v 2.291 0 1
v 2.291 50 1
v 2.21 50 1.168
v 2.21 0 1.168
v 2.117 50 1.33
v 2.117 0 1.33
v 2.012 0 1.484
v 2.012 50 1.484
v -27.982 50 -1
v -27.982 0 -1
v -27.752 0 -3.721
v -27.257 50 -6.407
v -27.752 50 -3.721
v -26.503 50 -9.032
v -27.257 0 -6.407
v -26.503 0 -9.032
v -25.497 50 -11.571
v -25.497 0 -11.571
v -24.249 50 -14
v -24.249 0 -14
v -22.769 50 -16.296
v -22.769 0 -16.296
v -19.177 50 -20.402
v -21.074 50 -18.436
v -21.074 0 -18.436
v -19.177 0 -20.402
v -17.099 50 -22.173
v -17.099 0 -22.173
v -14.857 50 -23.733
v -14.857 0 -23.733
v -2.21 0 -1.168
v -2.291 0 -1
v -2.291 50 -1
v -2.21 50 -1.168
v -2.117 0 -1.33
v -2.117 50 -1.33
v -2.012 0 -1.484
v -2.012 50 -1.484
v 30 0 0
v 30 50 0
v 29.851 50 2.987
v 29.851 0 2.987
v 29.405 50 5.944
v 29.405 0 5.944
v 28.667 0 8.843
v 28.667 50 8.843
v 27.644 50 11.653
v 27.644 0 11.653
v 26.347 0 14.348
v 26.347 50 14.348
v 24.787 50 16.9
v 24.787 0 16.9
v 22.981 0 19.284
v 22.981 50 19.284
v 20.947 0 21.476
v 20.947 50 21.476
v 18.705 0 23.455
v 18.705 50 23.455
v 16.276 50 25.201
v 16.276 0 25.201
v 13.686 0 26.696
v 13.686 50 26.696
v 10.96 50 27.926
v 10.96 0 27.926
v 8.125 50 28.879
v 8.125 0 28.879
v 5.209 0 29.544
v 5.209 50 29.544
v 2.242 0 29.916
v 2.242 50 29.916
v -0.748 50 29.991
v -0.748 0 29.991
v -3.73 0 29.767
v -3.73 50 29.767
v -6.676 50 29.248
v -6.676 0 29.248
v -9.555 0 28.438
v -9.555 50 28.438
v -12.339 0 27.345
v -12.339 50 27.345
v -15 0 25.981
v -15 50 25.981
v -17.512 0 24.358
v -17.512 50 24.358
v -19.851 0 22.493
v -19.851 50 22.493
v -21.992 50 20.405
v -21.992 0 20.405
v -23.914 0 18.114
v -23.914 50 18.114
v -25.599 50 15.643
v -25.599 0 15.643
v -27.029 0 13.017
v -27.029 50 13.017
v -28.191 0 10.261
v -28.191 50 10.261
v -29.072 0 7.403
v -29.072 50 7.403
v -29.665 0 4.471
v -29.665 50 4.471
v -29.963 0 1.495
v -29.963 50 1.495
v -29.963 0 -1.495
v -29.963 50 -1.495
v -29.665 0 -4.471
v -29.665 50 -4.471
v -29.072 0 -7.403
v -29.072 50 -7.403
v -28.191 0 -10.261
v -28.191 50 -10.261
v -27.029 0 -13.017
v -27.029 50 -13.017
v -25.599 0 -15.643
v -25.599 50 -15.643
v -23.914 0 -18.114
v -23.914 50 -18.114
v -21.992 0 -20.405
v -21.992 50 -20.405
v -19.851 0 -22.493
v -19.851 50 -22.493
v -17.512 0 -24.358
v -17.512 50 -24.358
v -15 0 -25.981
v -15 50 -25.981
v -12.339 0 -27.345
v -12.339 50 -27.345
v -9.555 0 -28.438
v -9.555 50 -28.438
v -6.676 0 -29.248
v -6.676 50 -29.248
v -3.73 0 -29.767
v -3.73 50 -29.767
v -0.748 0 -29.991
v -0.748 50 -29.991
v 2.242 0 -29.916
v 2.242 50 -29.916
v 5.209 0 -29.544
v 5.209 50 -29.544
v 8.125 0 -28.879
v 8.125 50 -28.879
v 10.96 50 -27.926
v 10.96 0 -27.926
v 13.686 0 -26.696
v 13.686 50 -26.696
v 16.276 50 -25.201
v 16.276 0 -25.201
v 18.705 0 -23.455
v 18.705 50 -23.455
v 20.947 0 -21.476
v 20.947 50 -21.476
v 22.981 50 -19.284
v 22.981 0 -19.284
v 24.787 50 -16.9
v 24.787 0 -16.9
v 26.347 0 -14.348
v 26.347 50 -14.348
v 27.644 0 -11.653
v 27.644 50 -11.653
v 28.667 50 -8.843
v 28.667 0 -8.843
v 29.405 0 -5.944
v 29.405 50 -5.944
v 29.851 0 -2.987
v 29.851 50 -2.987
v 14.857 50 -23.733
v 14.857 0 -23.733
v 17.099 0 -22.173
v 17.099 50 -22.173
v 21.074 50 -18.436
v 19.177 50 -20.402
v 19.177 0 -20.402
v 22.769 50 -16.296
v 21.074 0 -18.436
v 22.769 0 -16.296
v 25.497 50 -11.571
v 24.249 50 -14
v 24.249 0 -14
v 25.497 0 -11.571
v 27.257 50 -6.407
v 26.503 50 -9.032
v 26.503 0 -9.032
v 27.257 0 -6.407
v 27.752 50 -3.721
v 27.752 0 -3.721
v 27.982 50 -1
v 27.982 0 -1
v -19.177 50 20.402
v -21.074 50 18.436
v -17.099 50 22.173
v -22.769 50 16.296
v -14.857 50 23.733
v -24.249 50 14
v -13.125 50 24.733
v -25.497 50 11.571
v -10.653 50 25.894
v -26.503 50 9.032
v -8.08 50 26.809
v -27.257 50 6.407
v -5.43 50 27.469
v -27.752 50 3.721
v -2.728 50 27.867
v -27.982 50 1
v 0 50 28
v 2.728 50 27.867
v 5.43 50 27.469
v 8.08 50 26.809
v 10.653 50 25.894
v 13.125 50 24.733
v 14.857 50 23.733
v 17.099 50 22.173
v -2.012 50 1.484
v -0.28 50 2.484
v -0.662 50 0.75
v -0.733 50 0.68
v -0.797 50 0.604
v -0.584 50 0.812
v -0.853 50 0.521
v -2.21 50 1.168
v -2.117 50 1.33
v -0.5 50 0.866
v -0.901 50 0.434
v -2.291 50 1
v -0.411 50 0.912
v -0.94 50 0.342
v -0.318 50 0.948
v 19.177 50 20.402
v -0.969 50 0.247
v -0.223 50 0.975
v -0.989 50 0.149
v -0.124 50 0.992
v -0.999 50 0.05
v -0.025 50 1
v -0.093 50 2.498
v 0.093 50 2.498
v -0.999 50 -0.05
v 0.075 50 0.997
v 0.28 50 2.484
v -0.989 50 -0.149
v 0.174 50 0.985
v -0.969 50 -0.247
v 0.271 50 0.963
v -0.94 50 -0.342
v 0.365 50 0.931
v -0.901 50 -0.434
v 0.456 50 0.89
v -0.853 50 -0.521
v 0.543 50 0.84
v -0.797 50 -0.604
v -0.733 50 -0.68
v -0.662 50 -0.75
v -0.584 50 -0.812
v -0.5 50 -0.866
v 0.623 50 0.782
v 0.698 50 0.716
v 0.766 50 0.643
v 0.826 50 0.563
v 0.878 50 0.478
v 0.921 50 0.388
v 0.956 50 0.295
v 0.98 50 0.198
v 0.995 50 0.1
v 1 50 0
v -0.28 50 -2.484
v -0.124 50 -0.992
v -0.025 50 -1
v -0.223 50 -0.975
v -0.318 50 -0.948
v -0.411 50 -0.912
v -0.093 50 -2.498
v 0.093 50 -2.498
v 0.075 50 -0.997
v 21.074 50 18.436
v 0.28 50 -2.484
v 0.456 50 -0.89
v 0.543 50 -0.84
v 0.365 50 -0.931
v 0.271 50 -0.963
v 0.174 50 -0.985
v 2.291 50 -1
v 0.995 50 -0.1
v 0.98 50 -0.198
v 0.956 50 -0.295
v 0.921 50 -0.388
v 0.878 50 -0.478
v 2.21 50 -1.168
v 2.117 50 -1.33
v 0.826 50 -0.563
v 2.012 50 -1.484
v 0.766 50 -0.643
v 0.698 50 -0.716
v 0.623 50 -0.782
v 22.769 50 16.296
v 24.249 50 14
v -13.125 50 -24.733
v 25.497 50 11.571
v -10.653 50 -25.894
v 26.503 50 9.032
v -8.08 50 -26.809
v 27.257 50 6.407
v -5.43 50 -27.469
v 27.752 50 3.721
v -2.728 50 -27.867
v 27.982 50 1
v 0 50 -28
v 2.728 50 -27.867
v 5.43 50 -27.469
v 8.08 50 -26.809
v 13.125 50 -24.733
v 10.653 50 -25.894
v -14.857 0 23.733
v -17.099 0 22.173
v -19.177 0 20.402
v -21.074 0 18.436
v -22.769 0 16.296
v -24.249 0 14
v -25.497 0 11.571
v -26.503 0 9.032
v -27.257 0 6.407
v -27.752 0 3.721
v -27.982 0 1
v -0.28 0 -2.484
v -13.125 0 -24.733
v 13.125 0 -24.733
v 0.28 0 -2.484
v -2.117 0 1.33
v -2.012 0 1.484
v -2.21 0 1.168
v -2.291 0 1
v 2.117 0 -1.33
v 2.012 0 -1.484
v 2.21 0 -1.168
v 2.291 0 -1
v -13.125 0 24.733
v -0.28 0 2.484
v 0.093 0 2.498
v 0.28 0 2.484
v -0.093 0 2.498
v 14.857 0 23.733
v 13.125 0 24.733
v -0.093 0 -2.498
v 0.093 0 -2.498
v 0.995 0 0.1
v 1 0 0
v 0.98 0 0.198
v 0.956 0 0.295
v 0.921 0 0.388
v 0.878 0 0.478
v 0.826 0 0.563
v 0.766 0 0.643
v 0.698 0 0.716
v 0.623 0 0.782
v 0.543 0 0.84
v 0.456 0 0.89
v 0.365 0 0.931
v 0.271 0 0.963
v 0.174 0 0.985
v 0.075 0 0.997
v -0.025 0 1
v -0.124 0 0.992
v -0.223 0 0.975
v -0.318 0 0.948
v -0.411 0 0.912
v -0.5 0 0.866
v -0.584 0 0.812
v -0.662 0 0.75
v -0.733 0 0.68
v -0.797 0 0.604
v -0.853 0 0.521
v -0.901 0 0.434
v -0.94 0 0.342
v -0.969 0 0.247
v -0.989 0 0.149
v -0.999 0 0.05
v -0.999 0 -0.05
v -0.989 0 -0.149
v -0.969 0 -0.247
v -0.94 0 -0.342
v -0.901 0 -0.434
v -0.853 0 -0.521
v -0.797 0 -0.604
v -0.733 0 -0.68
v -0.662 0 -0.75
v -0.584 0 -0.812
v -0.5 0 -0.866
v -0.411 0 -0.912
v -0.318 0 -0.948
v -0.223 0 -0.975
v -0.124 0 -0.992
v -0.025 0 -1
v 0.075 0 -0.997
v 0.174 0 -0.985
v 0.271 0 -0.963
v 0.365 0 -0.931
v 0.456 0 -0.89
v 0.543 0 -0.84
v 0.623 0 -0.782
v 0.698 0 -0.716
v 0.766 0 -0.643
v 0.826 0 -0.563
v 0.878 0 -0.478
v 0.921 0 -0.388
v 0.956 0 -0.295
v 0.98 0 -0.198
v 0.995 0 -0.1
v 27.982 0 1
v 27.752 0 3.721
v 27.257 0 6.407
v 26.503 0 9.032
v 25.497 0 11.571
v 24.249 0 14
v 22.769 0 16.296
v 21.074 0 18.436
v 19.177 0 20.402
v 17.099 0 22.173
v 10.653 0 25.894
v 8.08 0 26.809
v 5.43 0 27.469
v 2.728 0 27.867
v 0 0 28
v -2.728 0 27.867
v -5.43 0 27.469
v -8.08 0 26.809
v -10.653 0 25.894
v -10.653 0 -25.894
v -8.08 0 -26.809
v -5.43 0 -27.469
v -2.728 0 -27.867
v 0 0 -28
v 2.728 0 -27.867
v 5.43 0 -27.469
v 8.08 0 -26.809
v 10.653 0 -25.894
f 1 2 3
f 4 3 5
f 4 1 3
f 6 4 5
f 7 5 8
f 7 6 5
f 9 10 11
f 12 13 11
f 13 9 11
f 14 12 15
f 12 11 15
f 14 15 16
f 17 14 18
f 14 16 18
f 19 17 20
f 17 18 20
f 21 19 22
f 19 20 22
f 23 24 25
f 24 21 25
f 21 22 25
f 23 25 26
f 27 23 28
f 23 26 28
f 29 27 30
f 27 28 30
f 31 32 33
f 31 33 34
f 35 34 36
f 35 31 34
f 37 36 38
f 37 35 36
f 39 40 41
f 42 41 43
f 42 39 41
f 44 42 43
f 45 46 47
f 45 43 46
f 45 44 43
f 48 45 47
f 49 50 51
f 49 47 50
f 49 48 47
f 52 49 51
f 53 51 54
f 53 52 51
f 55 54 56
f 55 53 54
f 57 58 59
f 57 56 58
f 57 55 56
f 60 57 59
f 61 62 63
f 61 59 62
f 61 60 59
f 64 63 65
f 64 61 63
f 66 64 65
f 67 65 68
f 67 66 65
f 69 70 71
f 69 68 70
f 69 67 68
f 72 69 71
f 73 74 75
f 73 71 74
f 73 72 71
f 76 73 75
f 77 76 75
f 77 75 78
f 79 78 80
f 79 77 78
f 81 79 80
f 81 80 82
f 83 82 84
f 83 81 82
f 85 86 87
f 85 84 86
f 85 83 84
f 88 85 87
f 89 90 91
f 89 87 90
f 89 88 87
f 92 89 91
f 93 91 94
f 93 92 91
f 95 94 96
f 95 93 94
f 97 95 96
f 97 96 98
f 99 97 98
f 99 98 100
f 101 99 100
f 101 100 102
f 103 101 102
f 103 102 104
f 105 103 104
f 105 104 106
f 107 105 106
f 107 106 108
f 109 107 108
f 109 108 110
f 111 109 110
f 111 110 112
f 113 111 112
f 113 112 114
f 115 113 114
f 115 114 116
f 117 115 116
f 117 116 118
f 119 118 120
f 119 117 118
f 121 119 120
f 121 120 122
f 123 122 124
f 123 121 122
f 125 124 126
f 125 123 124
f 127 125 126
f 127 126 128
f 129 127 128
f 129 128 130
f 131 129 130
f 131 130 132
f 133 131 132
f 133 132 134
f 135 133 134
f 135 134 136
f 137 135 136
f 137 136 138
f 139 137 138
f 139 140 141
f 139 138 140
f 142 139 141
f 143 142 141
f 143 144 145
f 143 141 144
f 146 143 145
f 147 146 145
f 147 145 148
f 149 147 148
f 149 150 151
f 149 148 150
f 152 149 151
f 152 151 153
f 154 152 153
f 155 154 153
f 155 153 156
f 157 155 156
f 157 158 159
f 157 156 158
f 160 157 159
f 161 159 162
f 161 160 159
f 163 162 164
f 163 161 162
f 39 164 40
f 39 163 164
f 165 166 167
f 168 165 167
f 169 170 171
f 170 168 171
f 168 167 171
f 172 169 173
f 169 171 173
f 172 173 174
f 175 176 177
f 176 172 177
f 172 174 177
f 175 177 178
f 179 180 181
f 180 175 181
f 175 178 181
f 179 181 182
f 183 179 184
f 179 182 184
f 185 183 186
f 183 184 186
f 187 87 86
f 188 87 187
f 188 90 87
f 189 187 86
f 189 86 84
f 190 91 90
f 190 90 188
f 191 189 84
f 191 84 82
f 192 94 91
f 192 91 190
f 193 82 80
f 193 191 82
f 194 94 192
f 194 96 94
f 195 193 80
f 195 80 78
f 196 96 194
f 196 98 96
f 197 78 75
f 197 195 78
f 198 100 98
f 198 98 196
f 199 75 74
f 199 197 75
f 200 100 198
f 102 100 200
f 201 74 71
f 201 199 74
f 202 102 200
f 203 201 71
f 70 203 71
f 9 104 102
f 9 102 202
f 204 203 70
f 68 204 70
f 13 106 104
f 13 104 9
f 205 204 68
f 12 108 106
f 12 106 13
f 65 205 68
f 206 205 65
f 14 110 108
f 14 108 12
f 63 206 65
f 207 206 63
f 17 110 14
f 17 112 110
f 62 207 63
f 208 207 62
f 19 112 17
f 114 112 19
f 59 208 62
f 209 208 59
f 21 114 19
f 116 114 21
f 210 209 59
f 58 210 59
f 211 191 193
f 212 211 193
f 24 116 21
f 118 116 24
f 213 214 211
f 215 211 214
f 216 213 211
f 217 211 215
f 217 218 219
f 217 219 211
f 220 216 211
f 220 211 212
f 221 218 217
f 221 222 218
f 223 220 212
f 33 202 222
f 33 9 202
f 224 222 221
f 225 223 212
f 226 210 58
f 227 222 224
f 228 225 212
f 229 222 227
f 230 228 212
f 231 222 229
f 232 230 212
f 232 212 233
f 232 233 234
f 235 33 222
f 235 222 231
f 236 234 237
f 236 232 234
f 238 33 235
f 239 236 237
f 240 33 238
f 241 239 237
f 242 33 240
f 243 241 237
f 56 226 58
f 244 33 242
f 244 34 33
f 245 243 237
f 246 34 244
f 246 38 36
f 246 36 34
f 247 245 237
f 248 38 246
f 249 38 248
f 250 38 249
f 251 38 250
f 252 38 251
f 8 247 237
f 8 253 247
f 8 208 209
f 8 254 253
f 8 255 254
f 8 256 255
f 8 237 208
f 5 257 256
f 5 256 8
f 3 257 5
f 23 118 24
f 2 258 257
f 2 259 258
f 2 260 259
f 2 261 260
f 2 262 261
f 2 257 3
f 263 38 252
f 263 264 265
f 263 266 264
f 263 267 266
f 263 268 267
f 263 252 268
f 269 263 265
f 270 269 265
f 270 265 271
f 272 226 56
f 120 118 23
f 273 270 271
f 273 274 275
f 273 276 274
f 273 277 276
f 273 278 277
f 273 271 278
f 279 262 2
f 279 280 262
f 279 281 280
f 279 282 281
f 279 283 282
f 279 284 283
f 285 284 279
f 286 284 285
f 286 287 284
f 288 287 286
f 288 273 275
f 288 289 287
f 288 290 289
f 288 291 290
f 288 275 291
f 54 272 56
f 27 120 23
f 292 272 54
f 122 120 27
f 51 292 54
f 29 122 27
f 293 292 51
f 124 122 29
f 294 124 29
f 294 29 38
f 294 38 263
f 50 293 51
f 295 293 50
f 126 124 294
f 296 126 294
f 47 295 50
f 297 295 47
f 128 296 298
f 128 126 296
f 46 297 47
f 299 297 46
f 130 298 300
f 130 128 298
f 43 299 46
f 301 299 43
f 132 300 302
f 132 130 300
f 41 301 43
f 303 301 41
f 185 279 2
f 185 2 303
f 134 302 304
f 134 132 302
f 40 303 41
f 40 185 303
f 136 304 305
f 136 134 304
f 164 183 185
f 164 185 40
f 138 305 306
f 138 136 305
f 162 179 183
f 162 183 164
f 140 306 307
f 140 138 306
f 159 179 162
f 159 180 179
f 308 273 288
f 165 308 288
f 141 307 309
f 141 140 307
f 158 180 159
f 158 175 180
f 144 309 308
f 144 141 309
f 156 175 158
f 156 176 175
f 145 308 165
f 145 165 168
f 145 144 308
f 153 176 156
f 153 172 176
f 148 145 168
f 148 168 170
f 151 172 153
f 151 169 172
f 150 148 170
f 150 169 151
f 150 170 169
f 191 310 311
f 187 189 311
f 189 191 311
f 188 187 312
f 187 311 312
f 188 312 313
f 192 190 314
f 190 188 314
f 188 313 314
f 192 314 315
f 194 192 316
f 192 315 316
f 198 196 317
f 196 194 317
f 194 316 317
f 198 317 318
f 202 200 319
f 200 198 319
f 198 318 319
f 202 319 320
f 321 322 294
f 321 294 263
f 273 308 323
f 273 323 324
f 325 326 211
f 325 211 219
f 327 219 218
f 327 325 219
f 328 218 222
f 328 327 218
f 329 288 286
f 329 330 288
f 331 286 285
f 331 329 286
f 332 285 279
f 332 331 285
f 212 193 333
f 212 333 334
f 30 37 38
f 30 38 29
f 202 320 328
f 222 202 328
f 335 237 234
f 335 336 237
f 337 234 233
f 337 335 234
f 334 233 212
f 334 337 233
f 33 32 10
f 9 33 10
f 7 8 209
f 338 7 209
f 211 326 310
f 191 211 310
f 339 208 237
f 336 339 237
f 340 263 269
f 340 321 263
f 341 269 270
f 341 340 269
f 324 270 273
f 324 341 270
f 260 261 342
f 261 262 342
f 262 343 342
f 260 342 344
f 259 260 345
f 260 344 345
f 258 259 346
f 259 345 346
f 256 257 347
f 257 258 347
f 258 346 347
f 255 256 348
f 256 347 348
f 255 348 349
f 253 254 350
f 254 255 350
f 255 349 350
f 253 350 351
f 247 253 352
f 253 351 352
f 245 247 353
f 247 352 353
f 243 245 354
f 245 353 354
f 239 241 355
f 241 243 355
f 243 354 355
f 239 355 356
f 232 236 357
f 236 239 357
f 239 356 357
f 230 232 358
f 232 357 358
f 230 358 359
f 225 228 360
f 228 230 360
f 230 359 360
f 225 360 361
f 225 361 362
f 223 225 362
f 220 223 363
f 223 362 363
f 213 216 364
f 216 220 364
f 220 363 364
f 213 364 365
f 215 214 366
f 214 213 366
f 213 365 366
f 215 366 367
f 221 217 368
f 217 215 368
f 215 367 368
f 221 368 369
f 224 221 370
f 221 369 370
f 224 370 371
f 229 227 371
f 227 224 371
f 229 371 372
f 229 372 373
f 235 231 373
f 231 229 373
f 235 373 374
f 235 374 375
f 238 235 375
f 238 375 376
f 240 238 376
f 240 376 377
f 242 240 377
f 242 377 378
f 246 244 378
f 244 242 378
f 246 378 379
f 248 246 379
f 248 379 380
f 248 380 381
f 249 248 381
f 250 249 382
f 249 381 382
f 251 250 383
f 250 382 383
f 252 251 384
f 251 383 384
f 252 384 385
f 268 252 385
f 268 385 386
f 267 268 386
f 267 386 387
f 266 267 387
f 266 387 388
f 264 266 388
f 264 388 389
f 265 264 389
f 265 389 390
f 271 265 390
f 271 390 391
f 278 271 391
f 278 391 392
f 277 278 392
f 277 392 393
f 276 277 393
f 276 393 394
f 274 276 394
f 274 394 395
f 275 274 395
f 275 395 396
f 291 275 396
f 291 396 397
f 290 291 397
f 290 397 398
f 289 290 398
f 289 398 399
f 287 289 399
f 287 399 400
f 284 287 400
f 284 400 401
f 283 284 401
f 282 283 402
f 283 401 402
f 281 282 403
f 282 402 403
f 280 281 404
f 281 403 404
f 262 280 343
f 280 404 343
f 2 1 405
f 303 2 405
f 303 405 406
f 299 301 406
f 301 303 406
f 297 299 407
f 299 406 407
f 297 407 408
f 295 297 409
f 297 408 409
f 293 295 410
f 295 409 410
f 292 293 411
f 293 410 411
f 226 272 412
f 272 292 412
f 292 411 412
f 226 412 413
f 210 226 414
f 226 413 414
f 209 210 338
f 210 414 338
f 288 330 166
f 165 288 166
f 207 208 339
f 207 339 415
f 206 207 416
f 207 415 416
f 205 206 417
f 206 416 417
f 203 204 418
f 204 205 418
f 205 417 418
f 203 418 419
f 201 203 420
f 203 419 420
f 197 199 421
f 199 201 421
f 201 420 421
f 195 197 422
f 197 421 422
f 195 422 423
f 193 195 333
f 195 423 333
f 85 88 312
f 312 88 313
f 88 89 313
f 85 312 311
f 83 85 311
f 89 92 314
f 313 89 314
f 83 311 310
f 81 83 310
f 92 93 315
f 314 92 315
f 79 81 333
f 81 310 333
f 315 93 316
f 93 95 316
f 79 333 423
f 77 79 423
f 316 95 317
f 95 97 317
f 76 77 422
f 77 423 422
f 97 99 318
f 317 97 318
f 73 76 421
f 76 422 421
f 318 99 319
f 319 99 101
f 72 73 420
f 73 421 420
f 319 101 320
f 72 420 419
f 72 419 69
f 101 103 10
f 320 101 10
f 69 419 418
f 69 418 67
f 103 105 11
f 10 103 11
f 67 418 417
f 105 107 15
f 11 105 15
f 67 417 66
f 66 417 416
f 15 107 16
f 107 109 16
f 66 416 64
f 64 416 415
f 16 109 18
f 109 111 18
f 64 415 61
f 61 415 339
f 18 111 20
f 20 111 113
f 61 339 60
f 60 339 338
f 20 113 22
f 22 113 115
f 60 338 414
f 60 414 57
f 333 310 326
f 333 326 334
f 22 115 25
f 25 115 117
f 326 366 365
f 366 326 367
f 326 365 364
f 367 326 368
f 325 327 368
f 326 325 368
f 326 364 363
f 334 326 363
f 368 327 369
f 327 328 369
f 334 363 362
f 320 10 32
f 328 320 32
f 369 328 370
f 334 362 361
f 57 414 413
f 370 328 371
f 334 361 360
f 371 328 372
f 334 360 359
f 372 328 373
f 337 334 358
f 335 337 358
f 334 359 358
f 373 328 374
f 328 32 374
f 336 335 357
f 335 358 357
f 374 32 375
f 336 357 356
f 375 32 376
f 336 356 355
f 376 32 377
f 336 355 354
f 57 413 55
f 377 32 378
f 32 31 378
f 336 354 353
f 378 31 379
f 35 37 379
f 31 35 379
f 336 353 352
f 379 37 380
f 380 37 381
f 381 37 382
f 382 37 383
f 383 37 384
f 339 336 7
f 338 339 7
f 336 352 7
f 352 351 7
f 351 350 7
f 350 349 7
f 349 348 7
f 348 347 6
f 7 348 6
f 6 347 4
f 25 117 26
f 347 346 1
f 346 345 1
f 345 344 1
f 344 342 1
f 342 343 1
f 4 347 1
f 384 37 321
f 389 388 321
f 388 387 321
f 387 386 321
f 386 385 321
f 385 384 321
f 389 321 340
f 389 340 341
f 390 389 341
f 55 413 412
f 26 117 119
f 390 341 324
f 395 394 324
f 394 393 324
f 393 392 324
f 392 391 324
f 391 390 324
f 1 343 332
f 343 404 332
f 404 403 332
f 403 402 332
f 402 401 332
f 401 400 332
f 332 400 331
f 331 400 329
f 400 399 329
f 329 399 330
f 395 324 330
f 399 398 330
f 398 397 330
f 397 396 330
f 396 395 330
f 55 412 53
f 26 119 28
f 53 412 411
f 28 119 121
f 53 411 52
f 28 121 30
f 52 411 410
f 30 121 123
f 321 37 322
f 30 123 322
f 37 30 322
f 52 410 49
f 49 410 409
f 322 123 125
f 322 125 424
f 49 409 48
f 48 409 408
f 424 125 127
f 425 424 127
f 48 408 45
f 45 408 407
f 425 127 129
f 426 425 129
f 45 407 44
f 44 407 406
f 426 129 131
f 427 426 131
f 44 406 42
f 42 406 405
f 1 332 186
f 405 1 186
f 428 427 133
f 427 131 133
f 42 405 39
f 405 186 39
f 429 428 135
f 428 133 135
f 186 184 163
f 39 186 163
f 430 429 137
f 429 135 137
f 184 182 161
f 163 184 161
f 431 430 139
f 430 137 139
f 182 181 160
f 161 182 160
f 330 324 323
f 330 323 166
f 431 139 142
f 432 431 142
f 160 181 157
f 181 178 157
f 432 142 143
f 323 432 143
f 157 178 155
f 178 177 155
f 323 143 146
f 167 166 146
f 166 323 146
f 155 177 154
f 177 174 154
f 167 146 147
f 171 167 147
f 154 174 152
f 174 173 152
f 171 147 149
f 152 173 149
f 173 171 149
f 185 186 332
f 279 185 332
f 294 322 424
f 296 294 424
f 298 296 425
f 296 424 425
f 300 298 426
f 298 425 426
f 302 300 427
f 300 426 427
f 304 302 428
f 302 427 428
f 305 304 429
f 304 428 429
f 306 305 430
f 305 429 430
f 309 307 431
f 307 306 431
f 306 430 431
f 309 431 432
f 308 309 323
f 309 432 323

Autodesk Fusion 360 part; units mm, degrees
sketch "Sketch1" plane through (0, 0, 0) normal (0, 1, 0) x (1, 0, 0)
  circle A0 centre (0, 0) radius 30
  circle A1 centre (0, 0) radius 1
  circle A2 centre (0, 0) radius 2.5
  circle A3 centre (0, 0) radius 28
  dimension "d1" = 60
  dimension "d2" = 2
  dimension "d3" = 5
  dimension "d4" = 56
extrude "Extrude1" add sketch "Sketch1" along normal blind 50 makes body 1 at (29.8509, 16.6667, 2.987) makes body 2 at (2.4876, 16.6667, 0.2489)
sketch "Sketch2" plane through (0, 0, 0) normal (0, 1, 0) x (1, 0, 0)
  line L0 (-13.634, -25.6147) -> (15.366, 24.6147)
  line L1 (15.366, 24.6147) -> (13.634, 25.6147)
  line L2 (13.634, 25.6147) -> (-15.366, -24.6147)
  line L3 (-15.366, -24.6147) -> (-13.634, -25.6147)
  line L4 (-13.634, -25.6147) -> (13.634, 25.6147) construction
  line L5 (15.366, 24.6147) -> (-15.366, -24.6147) construction
  line L6 (13.634, -25.6147) -> (-15.366, 24.6147)
  line L7 (-15.366, 24.6147) -> (-13.634, 25.6147)
  line L8 (-13.634, 25.6147) -> (15.366, -24.6147)
  line L9 (15.366, -24.6147) -> (13.634, -25.6147)
  line L10 (13.634, -25.6147) -> (-13.634, 25.6147) construction
  line L11 (-15.366, 24.6147) -> (15.366, -24.6147) construction
  line L12 (29, 1) -> (-29, 1)
  line L13 (-29, 1) -> (-29, -1)
  line L14 (-29, -1) -> (29, -1)
  line L15 (29, -1) -> (29, 1)
  line L16 (29, 1) -> (-29, -1) construction
  line L17 (-29, 1) -> (29, -1) construction
  dimension "d7" = 58
  dimension "d8" = 2
  dimension "d9" = 58
  dimension "d10" = 2
  dimension "d11" = 58
  dimension "d12" = 2
extrude "Extrude2" add sketch "Sketch2" along normal blind 50 contours L0 L2 L3 L6 L14 | L0 L6 L8 L9 L14 | L2 L6 L12 L13 L14 | L0 L8 L12 L14 L15 | L0 L1 L2 L8 L12 | L2 L6 L7 L8 L12 bodies 1 2
